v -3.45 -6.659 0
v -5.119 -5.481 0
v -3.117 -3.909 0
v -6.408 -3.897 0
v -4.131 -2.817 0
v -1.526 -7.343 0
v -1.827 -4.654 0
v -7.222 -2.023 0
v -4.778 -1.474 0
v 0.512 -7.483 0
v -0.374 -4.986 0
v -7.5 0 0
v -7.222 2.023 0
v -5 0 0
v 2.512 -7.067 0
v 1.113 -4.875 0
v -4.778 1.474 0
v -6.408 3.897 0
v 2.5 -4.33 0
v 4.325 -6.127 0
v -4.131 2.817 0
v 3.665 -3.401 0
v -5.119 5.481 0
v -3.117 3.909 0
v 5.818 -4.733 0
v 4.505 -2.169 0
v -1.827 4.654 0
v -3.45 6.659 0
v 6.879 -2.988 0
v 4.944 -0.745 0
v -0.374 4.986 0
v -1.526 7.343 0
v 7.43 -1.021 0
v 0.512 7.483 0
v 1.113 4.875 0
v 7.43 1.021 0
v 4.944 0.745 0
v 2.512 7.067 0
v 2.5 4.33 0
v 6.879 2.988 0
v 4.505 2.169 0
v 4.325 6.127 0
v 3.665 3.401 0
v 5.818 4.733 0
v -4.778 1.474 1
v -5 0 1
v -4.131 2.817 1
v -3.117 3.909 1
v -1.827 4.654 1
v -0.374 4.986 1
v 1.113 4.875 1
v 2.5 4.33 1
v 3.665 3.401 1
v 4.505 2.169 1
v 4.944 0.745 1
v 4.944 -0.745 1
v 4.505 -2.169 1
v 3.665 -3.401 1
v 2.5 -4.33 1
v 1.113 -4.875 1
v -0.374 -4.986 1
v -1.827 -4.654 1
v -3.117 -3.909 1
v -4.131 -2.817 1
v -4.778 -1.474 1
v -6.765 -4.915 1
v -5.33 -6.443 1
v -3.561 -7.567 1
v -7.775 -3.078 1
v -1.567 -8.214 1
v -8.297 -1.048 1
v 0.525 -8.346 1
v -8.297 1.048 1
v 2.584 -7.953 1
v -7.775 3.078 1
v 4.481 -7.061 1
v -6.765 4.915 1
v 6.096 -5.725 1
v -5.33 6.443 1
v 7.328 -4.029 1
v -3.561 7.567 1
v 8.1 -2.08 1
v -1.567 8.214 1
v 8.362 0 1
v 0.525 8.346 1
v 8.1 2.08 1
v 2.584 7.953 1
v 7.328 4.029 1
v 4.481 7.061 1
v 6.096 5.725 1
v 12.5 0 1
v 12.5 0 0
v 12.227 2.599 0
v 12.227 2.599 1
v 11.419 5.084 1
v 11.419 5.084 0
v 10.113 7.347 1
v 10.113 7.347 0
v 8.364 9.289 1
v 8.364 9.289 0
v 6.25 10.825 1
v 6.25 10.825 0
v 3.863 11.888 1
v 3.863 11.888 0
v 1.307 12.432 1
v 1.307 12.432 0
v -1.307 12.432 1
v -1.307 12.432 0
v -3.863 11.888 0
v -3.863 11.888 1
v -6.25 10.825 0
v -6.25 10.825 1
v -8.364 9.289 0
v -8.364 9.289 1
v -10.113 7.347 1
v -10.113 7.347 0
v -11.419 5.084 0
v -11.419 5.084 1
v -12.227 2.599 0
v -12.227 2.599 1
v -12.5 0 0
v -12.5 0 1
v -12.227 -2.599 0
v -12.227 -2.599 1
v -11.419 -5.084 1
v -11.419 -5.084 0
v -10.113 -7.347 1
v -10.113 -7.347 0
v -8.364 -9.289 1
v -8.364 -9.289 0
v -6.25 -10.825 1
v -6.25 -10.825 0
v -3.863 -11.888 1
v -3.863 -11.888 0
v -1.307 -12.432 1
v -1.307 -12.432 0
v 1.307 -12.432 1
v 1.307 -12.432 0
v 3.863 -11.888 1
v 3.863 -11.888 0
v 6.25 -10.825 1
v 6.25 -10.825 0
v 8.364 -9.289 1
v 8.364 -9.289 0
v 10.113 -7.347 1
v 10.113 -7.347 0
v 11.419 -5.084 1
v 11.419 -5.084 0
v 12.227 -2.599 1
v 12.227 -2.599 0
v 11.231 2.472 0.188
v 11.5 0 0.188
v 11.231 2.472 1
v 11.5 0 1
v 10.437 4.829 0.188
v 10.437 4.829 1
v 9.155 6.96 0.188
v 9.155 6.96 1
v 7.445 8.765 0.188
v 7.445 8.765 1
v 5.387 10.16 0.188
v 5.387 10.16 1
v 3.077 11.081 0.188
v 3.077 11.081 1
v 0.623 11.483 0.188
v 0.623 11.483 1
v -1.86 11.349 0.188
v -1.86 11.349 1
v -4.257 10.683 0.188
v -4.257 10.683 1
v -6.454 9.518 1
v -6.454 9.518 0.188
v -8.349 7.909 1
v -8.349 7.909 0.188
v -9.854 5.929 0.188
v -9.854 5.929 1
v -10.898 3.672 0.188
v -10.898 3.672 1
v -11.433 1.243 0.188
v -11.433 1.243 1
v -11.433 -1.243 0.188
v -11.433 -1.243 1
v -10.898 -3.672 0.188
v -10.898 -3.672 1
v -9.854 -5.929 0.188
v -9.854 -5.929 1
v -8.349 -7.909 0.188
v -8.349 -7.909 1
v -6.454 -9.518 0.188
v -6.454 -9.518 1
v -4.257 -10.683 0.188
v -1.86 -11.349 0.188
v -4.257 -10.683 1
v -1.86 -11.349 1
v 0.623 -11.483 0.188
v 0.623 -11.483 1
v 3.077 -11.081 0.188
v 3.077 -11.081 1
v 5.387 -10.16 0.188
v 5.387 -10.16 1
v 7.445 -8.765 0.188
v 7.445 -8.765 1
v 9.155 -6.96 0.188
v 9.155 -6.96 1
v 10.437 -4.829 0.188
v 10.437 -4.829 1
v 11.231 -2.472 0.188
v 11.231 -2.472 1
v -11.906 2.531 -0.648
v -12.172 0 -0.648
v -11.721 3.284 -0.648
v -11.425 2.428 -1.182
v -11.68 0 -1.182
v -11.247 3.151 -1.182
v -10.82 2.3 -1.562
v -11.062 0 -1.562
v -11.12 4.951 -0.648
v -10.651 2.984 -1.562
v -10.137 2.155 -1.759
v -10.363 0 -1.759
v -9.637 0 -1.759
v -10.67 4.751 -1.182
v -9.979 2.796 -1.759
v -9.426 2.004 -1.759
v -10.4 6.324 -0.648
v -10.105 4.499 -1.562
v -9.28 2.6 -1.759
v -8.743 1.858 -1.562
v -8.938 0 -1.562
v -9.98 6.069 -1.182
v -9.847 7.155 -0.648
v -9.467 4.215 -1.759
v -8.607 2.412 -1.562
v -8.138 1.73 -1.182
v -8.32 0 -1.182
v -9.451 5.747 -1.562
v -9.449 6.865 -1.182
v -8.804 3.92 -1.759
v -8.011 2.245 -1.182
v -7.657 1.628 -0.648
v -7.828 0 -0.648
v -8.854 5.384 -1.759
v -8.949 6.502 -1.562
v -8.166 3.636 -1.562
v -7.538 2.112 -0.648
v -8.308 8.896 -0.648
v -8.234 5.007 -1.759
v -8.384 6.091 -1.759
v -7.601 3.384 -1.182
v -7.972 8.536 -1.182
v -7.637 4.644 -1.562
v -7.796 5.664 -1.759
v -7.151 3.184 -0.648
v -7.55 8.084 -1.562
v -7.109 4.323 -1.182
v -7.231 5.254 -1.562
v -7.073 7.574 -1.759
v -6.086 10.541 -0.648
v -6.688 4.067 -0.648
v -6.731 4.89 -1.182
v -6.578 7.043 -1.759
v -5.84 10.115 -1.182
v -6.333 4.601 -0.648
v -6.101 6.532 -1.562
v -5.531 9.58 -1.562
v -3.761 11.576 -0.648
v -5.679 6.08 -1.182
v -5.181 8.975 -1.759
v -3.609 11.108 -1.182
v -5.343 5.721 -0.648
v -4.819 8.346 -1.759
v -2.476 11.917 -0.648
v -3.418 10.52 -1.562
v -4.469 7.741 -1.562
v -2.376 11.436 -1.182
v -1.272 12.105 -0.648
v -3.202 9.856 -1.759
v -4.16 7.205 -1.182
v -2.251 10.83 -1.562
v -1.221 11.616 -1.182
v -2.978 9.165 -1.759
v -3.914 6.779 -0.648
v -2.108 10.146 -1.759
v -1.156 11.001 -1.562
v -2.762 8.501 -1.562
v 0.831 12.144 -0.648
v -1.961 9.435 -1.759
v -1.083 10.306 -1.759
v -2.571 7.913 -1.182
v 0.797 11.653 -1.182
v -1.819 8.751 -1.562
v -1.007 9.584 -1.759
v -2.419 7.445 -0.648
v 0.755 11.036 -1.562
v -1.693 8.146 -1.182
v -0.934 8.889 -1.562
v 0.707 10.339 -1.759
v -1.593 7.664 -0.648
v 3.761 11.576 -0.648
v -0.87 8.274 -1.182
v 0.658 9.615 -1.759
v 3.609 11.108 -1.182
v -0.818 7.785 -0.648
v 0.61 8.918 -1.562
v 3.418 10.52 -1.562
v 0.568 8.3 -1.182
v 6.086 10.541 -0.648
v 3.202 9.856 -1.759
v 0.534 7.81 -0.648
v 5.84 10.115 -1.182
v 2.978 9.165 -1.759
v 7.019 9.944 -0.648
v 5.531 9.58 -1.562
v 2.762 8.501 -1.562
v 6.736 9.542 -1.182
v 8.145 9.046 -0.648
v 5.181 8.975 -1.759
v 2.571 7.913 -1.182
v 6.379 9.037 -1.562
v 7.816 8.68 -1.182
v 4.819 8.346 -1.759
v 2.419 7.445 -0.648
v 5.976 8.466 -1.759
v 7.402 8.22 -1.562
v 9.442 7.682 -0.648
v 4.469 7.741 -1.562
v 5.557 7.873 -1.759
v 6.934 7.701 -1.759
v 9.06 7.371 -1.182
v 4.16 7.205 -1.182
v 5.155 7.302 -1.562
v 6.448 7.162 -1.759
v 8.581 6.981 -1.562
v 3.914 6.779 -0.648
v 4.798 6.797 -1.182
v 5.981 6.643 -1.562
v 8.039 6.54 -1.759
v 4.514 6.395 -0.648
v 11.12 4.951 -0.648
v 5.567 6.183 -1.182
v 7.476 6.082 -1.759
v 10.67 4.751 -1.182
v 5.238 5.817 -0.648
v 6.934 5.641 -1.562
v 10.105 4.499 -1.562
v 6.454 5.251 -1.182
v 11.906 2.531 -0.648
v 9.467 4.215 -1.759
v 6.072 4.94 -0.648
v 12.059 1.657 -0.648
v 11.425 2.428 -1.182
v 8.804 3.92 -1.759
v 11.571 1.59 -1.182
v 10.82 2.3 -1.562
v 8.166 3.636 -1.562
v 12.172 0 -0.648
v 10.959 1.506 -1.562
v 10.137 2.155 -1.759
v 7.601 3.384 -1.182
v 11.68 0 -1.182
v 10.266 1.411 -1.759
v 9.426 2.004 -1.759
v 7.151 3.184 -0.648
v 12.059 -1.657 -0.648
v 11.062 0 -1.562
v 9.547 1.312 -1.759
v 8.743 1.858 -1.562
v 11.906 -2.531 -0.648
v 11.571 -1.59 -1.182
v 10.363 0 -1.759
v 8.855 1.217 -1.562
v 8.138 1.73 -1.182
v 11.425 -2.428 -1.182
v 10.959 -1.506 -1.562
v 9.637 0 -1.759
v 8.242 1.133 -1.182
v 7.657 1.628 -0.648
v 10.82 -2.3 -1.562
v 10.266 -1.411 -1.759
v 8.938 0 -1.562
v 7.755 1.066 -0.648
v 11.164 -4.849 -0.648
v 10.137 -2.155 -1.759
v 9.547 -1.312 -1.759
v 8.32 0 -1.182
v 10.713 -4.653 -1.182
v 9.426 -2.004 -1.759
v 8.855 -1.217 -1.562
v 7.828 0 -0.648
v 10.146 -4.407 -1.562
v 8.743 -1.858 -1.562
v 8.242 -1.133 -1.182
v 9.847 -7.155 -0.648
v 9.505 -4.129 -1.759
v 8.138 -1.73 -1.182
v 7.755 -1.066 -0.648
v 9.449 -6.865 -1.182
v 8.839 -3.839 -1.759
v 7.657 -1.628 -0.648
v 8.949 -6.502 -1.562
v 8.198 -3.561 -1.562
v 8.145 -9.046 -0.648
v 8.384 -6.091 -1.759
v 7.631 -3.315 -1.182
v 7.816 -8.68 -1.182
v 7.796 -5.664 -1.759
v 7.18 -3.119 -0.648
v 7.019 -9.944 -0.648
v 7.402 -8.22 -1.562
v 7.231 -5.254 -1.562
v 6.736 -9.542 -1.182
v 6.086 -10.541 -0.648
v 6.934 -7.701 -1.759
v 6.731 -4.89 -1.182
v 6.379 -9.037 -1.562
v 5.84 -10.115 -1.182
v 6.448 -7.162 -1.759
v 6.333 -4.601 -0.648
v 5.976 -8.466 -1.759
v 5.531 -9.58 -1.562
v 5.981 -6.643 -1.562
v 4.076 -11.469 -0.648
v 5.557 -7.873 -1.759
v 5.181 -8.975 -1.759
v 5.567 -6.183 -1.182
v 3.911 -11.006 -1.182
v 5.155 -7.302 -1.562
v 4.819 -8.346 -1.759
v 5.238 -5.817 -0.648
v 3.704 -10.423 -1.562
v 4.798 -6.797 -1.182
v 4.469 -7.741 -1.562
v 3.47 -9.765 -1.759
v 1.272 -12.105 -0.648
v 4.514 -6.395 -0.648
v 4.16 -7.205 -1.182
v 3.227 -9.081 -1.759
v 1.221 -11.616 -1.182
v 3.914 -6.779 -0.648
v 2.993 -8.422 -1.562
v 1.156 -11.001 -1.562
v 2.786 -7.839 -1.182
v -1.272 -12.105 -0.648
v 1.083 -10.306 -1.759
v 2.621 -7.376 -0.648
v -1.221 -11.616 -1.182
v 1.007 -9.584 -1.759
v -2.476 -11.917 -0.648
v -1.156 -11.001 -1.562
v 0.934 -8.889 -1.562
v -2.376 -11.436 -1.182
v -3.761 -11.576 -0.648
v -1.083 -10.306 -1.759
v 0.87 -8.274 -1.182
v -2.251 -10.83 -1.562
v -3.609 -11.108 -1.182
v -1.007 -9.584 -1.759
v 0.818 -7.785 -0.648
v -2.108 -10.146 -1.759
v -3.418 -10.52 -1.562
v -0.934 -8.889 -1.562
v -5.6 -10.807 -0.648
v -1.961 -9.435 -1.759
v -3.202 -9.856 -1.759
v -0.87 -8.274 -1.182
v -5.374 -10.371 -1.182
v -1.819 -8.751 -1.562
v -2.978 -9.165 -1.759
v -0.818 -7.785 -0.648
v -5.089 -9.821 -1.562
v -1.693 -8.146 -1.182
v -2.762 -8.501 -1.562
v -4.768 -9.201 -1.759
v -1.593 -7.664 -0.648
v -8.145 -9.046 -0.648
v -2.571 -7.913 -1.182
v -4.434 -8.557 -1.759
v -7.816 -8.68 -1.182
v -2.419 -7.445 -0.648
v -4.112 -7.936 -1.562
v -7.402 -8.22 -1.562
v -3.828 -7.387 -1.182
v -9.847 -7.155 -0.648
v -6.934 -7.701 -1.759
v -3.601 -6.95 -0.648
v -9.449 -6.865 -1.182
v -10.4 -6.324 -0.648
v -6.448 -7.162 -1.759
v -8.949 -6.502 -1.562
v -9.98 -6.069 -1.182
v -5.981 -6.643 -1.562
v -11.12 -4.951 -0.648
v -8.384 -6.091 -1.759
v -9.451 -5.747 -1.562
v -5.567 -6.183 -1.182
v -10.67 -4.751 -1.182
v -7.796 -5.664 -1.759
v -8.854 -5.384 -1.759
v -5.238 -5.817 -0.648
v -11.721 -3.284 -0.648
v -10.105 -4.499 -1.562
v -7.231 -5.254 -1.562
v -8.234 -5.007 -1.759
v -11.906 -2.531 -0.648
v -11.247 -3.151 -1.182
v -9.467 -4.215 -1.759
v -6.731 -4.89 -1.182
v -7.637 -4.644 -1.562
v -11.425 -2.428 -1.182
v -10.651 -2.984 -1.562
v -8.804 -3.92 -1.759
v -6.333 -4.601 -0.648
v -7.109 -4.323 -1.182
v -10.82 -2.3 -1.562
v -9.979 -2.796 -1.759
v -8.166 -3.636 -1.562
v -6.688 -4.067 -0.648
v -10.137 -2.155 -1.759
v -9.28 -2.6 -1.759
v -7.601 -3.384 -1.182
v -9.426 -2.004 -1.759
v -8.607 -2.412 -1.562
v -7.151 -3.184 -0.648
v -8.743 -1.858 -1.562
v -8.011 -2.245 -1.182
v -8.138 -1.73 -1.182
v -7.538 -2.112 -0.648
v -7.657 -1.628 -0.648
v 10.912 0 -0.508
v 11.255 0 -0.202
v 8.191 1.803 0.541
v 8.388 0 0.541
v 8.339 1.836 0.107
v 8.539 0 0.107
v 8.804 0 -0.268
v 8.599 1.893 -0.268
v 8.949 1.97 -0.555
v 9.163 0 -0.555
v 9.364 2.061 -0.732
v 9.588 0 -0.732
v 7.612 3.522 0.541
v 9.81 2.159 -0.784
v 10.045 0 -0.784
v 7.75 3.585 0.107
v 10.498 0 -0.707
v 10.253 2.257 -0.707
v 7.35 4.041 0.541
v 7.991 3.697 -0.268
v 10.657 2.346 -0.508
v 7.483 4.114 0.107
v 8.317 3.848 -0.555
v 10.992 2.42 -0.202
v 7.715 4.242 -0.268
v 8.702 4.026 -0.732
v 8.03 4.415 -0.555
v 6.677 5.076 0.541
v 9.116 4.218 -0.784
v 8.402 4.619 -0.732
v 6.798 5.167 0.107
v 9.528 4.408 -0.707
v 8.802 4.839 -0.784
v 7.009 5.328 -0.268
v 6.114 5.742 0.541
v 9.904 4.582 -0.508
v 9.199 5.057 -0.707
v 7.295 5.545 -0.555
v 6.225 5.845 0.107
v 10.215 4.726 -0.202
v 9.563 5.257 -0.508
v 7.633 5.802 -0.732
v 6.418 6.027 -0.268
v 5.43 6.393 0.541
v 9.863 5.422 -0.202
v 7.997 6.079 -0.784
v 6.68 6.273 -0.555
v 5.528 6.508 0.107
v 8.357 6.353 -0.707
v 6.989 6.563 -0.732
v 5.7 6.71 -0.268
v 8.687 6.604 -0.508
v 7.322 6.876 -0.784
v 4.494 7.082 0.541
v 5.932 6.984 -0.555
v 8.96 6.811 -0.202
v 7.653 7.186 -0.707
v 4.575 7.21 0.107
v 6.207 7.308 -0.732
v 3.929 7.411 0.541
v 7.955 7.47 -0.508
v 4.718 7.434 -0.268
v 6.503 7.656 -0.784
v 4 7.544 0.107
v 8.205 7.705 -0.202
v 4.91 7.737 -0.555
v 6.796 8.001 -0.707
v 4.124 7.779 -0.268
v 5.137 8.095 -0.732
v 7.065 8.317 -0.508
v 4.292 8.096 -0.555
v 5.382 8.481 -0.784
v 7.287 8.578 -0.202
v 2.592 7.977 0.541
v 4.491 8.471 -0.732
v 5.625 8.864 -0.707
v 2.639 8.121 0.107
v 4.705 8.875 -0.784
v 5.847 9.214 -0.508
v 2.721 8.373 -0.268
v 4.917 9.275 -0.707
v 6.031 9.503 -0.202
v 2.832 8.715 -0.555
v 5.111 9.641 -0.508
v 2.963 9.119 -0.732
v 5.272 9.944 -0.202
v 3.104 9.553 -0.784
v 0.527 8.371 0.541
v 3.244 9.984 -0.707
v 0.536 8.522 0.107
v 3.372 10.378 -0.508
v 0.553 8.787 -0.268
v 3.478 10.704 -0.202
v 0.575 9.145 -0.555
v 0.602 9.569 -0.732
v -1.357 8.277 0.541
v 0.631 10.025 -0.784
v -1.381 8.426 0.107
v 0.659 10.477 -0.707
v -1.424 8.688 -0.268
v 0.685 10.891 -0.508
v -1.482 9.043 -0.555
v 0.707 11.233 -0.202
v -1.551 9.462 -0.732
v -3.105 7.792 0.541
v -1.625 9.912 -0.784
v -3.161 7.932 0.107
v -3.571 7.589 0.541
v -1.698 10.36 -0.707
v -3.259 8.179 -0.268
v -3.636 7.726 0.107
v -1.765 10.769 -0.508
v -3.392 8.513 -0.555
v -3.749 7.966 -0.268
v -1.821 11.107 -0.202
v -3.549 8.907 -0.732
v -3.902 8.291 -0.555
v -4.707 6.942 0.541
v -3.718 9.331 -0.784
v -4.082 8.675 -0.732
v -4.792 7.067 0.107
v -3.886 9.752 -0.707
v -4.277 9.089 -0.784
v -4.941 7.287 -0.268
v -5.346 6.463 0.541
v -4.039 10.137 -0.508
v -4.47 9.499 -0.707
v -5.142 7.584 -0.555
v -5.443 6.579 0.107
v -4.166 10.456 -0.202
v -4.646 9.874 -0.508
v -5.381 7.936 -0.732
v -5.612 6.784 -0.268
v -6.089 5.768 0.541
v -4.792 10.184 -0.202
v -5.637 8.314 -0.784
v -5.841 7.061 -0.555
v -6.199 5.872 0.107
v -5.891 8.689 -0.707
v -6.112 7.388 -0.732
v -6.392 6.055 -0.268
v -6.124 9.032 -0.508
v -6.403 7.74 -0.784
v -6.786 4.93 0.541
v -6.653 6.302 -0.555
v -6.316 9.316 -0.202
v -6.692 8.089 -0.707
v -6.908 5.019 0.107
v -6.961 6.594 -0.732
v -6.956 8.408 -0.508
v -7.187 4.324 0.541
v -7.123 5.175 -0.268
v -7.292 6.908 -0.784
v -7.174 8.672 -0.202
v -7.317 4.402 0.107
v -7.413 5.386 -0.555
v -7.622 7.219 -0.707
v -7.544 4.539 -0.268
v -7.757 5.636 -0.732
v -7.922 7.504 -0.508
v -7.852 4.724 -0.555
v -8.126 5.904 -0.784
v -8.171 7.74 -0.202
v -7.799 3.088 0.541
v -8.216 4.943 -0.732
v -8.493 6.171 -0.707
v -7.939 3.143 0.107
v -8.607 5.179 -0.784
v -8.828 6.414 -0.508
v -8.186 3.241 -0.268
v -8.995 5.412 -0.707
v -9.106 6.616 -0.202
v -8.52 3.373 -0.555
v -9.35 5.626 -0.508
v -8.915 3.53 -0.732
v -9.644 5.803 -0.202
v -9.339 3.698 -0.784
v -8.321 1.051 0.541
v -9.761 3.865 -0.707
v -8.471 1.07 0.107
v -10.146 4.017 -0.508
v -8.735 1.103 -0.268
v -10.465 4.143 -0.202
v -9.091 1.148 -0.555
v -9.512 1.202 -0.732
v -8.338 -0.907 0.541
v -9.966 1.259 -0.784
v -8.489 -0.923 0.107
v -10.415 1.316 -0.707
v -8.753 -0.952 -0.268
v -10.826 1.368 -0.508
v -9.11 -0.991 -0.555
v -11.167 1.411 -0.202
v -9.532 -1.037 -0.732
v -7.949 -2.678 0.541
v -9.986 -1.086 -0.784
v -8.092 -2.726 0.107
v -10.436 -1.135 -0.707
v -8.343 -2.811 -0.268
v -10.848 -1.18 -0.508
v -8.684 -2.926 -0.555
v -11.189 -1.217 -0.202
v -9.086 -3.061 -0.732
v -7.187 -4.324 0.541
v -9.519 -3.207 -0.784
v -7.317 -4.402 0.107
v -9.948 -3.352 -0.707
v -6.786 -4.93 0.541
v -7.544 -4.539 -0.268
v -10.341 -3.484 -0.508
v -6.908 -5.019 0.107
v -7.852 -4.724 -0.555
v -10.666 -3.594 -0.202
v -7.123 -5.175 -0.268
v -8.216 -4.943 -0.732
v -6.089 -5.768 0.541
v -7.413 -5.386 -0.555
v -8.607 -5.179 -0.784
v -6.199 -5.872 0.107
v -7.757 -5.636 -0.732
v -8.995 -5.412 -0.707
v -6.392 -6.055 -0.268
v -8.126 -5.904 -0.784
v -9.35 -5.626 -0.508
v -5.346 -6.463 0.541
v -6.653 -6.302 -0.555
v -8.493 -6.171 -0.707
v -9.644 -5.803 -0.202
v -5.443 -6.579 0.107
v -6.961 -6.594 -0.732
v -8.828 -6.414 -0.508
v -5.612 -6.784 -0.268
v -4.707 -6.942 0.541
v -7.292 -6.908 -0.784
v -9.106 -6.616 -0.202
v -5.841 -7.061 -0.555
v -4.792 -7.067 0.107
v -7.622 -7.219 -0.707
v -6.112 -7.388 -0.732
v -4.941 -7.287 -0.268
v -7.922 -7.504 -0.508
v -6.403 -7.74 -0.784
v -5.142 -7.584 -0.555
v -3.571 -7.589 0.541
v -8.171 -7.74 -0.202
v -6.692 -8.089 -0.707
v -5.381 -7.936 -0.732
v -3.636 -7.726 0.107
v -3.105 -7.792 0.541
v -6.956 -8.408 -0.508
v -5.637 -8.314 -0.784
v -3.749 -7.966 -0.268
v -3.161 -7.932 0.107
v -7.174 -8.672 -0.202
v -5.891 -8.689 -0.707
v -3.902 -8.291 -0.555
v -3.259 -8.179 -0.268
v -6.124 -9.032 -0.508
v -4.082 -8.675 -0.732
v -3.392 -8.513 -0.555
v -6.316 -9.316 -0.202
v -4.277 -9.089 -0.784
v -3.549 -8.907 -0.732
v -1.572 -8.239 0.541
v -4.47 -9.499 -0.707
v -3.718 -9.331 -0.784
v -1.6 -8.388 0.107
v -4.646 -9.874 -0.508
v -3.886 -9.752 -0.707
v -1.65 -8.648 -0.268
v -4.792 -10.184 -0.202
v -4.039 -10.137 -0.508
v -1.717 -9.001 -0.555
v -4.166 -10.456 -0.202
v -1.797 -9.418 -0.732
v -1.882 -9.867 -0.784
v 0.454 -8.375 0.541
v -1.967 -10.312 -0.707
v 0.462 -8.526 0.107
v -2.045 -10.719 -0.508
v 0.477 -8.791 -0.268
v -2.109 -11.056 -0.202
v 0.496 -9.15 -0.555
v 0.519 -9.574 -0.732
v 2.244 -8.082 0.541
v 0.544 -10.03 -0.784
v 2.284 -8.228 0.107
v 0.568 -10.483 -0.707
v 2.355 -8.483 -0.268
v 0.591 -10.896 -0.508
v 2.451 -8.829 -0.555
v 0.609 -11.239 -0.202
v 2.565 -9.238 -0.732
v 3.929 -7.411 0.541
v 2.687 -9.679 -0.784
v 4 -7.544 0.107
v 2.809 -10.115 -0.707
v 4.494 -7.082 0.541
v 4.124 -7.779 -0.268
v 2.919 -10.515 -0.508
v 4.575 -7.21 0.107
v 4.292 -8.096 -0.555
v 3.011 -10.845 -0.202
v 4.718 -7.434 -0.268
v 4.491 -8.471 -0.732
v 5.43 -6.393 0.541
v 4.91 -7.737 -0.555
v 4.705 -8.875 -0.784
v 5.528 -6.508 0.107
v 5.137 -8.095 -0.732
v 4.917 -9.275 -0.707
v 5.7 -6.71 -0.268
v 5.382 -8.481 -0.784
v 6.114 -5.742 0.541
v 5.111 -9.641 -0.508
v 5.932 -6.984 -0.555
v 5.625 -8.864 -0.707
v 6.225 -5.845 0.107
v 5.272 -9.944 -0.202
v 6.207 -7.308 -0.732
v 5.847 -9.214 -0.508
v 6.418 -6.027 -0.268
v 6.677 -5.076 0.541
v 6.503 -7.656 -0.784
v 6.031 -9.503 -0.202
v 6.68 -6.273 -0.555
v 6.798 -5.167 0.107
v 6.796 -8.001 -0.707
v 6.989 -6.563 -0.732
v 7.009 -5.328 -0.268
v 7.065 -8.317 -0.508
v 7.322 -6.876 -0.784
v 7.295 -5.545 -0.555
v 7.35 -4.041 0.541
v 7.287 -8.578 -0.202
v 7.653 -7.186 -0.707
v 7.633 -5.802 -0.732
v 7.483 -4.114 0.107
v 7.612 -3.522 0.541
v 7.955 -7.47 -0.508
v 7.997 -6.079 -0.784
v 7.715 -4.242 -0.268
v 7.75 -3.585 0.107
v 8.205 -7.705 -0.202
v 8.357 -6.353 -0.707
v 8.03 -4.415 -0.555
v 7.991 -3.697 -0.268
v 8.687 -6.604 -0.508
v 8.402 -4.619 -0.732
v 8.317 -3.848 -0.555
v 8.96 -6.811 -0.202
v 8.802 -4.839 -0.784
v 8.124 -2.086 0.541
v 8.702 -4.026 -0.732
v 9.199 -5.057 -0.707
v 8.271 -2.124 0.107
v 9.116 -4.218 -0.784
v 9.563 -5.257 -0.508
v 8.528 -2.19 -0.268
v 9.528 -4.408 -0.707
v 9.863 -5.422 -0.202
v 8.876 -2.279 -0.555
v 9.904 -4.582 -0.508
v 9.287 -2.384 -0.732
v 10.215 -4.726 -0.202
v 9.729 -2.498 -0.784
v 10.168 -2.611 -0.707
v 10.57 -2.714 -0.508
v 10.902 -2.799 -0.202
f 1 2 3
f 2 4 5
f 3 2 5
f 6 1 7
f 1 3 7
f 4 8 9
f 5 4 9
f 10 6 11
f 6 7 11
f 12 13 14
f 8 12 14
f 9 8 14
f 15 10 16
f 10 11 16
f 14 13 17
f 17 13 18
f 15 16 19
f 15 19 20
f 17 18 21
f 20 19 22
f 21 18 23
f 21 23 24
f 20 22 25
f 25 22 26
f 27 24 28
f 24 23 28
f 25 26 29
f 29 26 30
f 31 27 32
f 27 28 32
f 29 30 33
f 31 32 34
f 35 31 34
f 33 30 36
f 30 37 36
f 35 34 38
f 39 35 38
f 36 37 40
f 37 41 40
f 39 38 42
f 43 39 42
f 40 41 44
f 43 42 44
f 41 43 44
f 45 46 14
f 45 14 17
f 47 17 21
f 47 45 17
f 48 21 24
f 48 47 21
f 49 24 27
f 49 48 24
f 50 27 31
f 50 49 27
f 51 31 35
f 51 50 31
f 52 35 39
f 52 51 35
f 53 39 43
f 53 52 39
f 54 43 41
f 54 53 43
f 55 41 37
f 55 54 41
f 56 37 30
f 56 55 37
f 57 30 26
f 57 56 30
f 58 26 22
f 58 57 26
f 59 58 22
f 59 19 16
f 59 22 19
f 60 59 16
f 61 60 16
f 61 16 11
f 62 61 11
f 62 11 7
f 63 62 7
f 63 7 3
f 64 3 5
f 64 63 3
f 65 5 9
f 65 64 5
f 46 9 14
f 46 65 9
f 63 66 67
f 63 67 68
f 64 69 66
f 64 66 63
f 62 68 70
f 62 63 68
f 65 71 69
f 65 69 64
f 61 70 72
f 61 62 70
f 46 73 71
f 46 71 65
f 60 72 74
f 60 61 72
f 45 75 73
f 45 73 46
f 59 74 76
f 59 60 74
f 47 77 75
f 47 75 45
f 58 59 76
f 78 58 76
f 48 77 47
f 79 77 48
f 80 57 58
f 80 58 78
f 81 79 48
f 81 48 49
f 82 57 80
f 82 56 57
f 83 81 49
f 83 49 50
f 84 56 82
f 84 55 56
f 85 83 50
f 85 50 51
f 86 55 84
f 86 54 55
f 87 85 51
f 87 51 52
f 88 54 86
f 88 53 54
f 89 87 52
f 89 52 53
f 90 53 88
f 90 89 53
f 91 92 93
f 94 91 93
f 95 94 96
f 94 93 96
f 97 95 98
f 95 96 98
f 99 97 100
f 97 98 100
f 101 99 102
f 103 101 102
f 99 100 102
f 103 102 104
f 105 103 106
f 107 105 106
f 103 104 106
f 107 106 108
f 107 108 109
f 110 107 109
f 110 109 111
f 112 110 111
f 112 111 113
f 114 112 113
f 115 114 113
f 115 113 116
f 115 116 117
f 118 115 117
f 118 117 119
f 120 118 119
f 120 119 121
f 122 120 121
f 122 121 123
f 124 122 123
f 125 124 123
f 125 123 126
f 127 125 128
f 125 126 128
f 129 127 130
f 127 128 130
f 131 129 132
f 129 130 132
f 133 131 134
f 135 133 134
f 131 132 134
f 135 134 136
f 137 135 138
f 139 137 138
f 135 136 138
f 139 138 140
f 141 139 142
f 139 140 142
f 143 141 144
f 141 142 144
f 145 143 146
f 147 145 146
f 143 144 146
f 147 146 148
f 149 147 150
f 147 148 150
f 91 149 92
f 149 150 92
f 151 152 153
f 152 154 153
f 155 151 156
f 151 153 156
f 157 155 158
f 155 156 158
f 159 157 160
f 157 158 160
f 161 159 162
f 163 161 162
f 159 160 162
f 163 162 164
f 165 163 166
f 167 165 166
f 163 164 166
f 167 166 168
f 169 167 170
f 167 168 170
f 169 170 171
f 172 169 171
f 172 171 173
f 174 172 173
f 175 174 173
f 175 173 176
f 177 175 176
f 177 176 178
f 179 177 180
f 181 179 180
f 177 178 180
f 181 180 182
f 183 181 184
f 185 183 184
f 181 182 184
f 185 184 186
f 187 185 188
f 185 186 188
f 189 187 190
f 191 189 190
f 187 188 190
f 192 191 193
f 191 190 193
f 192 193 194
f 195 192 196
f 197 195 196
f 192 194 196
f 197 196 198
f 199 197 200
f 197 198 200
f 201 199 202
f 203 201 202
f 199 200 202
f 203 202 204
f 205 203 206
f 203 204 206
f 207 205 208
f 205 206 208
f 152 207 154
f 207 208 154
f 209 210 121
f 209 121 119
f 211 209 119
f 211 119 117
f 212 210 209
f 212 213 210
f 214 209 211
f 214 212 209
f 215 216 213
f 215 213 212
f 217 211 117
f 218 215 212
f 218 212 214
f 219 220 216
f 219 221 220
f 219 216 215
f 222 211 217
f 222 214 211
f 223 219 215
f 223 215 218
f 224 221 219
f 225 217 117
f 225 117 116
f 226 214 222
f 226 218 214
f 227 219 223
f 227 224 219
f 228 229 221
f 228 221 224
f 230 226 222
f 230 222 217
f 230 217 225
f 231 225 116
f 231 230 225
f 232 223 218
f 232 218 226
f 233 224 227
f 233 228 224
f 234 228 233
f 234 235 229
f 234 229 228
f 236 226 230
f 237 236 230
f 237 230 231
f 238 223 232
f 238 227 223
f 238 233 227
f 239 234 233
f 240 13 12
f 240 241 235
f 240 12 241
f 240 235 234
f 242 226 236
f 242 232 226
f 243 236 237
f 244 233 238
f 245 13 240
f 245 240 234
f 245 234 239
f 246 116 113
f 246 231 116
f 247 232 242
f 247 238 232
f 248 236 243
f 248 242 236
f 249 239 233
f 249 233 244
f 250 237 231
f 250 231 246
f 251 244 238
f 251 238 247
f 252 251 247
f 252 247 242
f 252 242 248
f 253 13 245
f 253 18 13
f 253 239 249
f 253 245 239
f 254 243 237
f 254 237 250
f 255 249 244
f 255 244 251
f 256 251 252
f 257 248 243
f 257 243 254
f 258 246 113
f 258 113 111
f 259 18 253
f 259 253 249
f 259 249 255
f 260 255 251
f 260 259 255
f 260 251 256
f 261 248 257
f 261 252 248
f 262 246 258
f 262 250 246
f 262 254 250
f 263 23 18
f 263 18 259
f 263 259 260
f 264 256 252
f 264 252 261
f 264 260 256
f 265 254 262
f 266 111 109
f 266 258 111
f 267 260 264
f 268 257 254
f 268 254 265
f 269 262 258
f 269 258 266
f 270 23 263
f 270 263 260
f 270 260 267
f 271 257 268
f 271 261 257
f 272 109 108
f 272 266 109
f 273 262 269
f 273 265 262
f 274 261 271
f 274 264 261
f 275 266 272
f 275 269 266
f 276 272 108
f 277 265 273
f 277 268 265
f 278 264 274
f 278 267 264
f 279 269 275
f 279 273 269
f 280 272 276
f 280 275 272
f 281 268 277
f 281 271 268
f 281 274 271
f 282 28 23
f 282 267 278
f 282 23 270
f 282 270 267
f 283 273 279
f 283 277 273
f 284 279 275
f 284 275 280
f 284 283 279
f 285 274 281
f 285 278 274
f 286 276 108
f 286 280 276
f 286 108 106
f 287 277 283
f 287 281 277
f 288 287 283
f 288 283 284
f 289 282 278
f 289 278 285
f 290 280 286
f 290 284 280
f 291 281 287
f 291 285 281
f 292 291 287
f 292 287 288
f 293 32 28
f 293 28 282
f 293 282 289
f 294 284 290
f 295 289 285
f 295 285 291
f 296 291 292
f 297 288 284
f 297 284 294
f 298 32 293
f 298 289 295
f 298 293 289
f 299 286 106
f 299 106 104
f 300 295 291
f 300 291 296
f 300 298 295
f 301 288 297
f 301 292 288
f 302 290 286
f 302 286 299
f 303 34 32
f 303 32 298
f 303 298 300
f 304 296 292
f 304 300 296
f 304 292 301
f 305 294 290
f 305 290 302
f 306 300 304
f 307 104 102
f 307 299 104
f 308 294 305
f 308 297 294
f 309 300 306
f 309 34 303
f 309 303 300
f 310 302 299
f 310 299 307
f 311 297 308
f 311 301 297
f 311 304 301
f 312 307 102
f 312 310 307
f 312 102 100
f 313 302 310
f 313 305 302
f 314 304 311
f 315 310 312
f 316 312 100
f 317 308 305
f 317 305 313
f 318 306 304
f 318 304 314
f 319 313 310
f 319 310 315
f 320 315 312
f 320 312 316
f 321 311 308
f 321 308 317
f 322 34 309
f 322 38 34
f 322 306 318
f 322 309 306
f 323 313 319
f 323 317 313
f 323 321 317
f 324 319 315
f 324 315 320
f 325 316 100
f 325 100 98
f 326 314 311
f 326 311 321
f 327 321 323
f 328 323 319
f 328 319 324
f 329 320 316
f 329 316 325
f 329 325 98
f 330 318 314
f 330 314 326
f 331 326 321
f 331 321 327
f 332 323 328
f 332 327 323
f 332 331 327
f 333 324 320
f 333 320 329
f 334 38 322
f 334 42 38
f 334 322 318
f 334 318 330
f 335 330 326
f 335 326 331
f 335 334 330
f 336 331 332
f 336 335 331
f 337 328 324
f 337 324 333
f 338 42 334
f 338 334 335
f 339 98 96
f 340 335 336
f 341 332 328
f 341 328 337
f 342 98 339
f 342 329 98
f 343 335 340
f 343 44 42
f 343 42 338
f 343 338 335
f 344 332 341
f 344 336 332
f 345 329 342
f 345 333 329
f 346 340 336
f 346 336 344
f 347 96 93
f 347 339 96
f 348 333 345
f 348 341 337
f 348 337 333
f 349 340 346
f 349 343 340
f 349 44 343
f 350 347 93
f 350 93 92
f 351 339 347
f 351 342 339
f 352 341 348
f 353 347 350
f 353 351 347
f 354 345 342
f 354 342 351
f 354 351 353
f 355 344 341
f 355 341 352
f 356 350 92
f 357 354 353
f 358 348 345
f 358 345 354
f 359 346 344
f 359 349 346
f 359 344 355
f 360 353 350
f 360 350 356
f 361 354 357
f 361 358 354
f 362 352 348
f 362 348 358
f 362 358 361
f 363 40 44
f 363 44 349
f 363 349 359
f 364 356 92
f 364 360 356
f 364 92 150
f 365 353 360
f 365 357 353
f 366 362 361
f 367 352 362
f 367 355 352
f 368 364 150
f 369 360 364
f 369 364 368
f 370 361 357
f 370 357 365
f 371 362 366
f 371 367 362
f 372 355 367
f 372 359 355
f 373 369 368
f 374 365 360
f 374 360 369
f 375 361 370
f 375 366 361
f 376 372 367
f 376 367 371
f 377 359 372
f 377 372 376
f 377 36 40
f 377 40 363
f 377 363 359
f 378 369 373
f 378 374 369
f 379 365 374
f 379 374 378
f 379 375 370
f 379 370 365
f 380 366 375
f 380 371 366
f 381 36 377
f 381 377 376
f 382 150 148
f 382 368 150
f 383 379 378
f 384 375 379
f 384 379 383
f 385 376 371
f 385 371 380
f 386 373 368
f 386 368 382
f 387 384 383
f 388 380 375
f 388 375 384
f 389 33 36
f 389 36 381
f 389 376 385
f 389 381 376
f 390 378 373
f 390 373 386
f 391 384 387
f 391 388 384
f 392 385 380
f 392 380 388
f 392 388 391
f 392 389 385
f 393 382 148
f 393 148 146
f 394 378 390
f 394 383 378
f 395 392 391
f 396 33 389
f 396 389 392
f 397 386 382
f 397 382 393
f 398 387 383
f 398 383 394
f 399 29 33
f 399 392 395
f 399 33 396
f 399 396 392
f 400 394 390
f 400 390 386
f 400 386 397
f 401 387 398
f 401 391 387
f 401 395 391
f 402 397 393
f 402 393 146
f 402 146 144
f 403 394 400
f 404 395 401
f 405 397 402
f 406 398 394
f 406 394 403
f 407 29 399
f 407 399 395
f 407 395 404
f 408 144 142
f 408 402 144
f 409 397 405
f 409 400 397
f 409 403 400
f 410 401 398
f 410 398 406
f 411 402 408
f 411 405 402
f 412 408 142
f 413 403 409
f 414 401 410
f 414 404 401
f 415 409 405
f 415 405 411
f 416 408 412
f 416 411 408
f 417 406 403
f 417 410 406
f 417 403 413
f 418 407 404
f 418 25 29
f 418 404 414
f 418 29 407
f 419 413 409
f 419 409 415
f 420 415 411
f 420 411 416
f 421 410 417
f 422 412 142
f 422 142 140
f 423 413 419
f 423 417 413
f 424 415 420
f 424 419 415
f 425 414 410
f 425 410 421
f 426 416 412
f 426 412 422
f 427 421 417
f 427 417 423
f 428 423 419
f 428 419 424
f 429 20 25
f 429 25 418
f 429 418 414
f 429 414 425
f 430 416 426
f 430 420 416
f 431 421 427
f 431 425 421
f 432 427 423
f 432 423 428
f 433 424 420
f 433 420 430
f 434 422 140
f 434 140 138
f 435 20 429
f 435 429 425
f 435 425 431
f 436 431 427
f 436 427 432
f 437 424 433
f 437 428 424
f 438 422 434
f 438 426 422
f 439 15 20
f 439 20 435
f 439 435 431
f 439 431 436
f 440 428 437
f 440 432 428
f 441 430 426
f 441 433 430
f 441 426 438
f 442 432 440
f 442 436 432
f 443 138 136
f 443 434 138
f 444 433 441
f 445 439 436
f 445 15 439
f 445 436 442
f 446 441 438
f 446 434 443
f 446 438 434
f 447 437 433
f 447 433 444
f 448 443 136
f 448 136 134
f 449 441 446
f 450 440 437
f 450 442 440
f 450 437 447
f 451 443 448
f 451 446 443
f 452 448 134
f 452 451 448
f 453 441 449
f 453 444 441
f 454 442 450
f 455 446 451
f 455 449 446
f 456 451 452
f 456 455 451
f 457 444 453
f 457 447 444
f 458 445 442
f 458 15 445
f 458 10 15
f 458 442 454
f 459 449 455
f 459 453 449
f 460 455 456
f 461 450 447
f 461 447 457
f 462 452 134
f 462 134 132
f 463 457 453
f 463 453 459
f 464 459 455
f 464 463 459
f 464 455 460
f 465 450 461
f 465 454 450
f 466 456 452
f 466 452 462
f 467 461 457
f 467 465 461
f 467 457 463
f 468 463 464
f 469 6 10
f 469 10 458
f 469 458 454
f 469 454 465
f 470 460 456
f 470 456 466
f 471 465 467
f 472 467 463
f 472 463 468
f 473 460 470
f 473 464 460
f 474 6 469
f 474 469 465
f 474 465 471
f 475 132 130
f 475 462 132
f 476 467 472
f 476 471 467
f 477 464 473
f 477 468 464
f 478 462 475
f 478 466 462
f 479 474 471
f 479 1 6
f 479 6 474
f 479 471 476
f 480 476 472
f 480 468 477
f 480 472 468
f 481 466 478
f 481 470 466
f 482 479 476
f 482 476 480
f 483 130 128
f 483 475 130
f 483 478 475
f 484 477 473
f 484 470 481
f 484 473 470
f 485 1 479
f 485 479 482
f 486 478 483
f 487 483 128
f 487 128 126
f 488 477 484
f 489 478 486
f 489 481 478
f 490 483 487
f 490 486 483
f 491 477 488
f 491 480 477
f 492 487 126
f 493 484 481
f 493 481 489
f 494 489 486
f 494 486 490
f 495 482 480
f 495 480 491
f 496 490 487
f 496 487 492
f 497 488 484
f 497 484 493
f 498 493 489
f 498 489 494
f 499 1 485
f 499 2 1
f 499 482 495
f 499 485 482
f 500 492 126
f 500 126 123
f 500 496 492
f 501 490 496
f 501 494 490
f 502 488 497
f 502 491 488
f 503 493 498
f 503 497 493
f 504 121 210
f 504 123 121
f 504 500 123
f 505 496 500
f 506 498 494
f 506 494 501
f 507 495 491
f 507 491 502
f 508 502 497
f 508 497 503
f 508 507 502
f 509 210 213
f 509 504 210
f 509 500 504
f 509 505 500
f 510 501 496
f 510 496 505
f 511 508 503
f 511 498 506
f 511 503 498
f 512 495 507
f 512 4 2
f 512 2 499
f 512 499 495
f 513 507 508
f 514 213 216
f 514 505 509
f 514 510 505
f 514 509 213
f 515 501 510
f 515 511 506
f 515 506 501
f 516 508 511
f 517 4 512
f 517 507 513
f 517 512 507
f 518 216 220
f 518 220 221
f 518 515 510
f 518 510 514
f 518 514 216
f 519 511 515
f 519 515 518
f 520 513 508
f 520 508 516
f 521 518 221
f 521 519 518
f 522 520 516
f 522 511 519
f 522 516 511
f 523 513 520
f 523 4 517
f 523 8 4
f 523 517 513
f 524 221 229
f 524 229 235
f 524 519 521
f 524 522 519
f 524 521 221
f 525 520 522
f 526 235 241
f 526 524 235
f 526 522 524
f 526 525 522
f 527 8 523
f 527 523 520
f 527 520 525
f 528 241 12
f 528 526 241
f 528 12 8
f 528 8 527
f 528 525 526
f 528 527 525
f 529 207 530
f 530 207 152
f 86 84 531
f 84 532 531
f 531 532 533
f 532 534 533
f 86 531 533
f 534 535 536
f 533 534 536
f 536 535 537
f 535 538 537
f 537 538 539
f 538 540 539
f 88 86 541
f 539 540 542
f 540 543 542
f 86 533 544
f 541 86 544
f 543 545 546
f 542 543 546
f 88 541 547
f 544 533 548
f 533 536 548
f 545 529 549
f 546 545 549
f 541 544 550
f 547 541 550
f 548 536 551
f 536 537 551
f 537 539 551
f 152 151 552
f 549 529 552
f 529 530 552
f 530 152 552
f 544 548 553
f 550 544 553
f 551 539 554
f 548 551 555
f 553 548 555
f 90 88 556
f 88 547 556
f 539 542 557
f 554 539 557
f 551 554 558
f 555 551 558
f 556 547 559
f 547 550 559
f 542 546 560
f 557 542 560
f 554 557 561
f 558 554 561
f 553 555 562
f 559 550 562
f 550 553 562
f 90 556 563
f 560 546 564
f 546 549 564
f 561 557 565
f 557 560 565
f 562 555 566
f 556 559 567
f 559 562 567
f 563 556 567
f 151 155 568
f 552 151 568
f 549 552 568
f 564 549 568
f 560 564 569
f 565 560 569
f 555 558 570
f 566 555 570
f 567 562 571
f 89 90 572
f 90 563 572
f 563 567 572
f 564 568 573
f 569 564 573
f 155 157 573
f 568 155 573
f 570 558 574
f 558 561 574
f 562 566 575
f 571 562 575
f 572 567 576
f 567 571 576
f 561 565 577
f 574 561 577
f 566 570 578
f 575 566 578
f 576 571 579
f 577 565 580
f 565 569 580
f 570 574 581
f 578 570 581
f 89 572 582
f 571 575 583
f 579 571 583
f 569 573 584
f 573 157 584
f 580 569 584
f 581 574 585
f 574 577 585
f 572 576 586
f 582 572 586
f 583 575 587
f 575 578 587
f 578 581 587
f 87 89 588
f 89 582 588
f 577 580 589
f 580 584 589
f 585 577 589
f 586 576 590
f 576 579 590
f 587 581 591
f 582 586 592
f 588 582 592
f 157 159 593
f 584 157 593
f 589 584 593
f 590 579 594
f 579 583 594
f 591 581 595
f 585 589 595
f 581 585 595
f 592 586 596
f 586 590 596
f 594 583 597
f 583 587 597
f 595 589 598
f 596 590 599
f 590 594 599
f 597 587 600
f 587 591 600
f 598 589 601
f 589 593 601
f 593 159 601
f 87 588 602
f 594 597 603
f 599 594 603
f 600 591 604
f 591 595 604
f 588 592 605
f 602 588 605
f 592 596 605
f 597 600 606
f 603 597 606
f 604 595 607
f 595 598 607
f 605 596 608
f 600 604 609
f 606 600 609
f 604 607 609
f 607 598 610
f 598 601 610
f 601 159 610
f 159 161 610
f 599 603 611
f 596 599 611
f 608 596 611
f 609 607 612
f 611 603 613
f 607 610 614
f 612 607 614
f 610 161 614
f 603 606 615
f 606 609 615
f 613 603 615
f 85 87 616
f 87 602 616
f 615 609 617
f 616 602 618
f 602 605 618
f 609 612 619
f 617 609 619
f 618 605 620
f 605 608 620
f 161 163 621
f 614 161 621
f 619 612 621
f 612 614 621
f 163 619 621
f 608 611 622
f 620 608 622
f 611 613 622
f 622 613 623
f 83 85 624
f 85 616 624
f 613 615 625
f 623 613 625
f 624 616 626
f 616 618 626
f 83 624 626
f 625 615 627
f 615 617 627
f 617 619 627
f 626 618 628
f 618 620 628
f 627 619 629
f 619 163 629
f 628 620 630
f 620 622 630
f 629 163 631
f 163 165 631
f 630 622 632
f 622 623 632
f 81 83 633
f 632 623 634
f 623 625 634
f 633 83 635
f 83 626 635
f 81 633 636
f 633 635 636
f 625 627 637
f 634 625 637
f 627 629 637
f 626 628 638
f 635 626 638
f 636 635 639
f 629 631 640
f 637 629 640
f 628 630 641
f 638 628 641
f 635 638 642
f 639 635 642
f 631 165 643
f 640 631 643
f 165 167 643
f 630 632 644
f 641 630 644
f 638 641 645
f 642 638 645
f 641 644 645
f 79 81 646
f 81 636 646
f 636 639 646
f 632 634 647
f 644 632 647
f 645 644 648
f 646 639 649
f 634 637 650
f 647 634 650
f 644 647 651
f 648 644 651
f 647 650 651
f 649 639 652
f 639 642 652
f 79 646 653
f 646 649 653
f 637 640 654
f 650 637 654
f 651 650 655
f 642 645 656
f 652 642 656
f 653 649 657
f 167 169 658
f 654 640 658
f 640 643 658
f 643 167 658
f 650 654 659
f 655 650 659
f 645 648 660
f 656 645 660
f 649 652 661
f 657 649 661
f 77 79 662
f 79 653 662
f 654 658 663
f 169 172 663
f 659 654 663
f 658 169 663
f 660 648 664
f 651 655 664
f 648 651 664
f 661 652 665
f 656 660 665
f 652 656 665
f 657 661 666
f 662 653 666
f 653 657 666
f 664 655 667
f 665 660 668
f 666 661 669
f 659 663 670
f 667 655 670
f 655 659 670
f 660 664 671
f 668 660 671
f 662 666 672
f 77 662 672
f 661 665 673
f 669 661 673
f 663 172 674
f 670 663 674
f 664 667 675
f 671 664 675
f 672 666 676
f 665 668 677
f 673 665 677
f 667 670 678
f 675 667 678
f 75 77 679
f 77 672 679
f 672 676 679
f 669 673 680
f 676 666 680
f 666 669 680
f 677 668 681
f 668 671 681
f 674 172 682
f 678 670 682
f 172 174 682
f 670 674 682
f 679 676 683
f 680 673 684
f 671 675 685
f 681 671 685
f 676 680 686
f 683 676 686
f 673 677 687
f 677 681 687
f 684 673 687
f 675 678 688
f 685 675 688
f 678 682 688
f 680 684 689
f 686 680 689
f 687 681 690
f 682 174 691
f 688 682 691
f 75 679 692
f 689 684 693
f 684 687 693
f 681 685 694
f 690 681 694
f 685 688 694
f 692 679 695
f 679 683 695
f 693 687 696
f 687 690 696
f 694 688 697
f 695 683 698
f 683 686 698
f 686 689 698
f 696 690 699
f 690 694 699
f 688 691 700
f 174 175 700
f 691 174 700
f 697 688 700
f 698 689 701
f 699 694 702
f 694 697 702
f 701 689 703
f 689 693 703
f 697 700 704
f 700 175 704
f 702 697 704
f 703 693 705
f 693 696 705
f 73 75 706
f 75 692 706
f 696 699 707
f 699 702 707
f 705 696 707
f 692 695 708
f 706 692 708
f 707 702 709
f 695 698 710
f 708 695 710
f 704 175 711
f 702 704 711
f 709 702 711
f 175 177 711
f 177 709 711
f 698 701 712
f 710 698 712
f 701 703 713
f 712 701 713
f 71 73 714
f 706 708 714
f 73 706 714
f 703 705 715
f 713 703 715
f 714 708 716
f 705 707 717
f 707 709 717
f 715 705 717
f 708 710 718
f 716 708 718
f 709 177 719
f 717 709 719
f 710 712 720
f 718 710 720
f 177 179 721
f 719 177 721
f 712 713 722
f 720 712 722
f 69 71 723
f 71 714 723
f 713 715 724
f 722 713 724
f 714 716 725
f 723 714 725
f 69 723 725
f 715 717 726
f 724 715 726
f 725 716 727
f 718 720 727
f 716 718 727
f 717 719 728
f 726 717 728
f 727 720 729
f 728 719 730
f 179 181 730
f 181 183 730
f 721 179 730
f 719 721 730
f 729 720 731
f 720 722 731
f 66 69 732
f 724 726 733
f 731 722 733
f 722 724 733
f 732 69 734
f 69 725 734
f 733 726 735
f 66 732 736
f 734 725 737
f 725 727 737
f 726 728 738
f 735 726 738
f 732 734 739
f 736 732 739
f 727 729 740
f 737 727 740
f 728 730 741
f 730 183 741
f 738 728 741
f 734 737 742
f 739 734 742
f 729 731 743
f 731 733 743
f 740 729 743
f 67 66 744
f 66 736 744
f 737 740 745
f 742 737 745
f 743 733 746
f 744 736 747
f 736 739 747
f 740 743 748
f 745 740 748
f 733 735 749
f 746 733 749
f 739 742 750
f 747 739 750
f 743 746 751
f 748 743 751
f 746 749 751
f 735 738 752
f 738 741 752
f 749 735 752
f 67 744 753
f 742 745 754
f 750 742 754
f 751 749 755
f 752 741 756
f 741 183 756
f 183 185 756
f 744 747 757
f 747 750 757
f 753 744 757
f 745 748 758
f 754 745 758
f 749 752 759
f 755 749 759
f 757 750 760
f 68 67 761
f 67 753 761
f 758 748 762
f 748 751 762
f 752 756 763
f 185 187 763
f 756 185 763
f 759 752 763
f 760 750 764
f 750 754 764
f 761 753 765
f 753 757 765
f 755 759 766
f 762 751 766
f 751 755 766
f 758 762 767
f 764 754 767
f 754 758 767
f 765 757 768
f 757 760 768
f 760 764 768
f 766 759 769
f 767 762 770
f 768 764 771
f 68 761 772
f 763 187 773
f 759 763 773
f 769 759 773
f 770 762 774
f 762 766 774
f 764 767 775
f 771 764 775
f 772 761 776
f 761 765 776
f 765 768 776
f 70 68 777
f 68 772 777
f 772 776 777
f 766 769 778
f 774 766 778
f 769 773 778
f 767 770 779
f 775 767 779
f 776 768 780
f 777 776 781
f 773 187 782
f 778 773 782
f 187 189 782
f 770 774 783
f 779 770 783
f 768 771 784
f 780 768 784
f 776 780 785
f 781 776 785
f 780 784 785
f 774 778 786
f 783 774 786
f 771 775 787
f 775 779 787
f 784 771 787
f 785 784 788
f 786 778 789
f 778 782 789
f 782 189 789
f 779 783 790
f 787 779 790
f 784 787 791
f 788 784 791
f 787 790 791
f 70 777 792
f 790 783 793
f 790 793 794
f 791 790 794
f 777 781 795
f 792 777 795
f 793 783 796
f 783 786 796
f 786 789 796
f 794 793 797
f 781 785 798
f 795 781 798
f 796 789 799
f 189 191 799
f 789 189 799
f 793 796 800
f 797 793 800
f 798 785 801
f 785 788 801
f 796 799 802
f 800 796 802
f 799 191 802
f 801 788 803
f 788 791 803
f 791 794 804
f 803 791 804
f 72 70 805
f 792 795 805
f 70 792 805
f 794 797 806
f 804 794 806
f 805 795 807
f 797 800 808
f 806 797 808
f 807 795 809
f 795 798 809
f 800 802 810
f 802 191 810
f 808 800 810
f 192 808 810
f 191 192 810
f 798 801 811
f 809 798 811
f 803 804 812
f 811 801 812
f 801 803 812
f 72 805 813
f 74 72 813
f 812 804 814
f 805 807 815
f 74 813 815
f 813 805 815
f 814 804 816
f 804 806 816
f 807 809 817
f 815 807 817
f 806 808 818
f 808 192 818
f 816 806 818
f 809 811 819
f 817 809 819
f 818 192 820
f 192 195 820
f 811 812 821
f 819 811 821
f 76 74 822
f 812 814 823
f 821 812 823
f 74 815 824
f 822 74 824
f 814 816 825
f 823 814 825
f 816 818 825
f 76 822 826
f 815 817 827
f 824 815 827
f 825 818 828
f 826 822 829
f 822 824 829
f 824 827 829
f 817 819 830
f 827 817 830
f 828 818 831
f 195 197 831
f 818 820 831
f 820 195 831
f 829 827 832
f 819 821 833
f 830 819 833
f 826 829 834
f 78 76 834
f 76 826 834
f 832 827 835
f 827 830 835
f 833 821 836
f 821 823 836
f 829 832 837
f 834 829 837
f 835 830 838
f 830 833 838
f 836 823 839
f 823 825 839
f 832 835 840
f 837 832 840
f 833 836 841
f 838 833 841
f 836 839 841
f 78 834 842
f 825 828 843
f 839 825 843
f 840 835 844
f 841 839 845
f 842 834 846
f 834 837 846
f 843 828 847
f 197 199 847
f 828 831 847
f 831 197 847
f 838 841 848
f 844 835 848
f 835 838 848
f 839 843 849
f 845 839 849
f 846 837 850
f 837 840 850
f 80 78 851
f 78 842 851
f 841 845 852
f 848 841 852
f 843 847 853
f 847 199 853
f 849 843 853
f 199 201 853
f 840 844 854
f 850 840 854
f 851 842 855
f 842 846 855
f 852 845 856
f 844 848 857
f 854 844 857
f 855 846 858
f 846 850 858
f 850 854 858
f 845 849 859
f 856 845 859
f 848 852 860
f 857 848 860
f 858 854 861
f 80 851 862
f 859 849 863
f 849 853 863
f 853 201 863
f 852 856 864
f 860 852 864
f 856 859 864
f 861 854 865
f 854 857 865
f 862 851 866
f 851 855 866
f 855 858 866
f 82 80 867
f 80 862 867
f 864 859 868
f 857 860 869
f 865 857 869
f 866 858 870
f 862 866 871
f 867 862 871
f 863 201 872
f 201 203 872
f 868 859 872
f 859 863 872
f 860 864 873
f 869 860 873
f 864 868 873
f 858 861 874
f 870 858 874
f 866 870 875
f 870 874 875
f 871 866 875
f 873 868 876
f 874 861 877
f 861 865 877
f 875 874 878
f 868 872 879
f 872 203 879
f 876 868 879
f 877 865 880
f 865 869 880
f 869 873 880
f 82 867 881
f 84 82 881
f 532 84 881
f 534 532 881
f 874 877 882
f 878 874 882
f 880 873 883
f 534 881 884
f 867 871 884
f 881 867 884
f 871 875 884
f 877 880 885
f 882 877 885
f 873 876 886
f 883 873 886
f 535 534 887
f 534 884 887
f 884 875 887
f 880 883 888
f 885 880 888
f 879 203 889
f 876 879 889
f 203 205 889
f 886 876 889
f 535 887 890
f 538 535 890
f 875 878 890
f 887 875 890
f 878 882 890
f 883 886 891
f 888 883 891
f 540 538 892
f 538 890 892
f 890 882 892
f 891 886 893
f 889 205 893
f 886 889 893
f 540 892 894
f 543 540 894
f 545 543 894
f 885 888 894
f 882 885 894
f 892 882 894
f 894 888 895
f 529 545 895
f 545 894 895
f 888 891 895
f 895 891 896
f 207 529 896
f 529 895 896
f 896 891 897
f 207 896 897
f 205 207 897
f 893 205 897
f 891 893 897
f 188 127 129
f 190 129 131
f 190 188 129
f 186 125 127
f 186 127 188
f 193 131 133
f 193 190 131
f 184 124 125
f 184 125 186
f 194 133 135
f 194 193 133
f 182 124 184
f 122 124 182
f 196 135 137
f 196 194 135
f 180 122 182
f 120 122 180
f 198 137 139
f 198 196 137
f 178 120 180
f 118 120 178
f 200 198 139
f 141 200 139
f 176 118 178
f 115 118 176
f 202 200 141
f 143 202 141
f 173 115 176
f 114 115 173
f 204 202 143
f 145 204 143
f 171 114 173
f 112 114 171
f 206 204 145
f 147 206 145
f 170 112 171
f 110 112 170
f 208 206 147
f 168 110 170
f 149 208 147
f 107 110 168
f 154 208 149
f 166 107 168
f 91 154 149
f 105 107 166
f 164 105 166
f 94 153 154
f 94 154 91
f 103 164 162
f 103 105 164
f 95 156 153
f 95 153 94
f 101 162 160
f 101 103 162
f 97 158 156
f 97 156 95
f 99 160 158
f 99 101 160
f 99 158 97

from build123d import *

# Parameters (mm, degrees)
SKETCH_1_R               = 12.5
EXTRUDE_1_DEPTH          = 1
CUT_EXTRUDE_1_DEPTH      = 18.767490446
CUT_EXTRUDE_1_DEPTH_BACK = 18.767490446
SKETCH_4_R               = 5


# Read off the part's stored shape, not the designer's step: 抽壳1
with BuildPart() as part:
    # 草图1 → 凸台-拉伸1 (new body)
    with BuildSketch(Plane.XY):
        Circle(SKETCH_1_R)
    extrude(amount=EXTRUDE_1_DEPTH)

    # 扫描1: sweep along a path in 草图2
    with BuildLine(Plane(origin=(0, 0, 0), x_dir=(-1, 0, 0), z_dir=(0, 0, -1))) as sweep_1_path:
        CenterArc((0, 0), 12.5, 0, 360)
    # 草图3 → 扫描1 (sweep)
    with BuildSketch(Plane(origin=(0, 0, 0), x_dir=(1, 0, 0), z_dir=(0, 1, 0))):
        with BuildLine():
            Line((-12.5, 0), (-7.5, 0))
            ThreePointArc((-7.5, 0), (-10, 1.784295774), (-12.5, 0))
        make_face()
    sweep(path=sweep_1_path.line)

    # 抽壳1 outline → 抽壳1 (revolve, cut)
    with BuildSketch(Plane.XZ):
        with BuildLine():
            Line((11.5, 0.18751359), (11.5, 1))
            Line((11.5, 1), (8.362499328, 1))
            ThreePointArc((8.362499328, 1), (9.587980401, -0.731813124), (11.5, 0.18751359))
        make_face()
    revolve(axis=Axis((0, 0, 0), (0, 0, 1)), mode=Mode.SUBTRACT)

    # 草图4 → 切除-拉伸1 (cut, two sides: drawn at the far end of the back side and taken through both)
    with BuildSketch(Plane(origin=(0, 0, 0), x_dir=(-1, 0, 0), z_dir=(0, 0, -1)).offset(-CUT_EXTRUDE_1_DEPTH_BACK)):
        Circle(SKETCH_4_R)
    extrude(amount=CUT_EXTRUDE_1_DEPTH + CUT_EXTRUDE_1_DEPTH_BACK, mode=Mode.SUBTRACT)


solid = part.part
